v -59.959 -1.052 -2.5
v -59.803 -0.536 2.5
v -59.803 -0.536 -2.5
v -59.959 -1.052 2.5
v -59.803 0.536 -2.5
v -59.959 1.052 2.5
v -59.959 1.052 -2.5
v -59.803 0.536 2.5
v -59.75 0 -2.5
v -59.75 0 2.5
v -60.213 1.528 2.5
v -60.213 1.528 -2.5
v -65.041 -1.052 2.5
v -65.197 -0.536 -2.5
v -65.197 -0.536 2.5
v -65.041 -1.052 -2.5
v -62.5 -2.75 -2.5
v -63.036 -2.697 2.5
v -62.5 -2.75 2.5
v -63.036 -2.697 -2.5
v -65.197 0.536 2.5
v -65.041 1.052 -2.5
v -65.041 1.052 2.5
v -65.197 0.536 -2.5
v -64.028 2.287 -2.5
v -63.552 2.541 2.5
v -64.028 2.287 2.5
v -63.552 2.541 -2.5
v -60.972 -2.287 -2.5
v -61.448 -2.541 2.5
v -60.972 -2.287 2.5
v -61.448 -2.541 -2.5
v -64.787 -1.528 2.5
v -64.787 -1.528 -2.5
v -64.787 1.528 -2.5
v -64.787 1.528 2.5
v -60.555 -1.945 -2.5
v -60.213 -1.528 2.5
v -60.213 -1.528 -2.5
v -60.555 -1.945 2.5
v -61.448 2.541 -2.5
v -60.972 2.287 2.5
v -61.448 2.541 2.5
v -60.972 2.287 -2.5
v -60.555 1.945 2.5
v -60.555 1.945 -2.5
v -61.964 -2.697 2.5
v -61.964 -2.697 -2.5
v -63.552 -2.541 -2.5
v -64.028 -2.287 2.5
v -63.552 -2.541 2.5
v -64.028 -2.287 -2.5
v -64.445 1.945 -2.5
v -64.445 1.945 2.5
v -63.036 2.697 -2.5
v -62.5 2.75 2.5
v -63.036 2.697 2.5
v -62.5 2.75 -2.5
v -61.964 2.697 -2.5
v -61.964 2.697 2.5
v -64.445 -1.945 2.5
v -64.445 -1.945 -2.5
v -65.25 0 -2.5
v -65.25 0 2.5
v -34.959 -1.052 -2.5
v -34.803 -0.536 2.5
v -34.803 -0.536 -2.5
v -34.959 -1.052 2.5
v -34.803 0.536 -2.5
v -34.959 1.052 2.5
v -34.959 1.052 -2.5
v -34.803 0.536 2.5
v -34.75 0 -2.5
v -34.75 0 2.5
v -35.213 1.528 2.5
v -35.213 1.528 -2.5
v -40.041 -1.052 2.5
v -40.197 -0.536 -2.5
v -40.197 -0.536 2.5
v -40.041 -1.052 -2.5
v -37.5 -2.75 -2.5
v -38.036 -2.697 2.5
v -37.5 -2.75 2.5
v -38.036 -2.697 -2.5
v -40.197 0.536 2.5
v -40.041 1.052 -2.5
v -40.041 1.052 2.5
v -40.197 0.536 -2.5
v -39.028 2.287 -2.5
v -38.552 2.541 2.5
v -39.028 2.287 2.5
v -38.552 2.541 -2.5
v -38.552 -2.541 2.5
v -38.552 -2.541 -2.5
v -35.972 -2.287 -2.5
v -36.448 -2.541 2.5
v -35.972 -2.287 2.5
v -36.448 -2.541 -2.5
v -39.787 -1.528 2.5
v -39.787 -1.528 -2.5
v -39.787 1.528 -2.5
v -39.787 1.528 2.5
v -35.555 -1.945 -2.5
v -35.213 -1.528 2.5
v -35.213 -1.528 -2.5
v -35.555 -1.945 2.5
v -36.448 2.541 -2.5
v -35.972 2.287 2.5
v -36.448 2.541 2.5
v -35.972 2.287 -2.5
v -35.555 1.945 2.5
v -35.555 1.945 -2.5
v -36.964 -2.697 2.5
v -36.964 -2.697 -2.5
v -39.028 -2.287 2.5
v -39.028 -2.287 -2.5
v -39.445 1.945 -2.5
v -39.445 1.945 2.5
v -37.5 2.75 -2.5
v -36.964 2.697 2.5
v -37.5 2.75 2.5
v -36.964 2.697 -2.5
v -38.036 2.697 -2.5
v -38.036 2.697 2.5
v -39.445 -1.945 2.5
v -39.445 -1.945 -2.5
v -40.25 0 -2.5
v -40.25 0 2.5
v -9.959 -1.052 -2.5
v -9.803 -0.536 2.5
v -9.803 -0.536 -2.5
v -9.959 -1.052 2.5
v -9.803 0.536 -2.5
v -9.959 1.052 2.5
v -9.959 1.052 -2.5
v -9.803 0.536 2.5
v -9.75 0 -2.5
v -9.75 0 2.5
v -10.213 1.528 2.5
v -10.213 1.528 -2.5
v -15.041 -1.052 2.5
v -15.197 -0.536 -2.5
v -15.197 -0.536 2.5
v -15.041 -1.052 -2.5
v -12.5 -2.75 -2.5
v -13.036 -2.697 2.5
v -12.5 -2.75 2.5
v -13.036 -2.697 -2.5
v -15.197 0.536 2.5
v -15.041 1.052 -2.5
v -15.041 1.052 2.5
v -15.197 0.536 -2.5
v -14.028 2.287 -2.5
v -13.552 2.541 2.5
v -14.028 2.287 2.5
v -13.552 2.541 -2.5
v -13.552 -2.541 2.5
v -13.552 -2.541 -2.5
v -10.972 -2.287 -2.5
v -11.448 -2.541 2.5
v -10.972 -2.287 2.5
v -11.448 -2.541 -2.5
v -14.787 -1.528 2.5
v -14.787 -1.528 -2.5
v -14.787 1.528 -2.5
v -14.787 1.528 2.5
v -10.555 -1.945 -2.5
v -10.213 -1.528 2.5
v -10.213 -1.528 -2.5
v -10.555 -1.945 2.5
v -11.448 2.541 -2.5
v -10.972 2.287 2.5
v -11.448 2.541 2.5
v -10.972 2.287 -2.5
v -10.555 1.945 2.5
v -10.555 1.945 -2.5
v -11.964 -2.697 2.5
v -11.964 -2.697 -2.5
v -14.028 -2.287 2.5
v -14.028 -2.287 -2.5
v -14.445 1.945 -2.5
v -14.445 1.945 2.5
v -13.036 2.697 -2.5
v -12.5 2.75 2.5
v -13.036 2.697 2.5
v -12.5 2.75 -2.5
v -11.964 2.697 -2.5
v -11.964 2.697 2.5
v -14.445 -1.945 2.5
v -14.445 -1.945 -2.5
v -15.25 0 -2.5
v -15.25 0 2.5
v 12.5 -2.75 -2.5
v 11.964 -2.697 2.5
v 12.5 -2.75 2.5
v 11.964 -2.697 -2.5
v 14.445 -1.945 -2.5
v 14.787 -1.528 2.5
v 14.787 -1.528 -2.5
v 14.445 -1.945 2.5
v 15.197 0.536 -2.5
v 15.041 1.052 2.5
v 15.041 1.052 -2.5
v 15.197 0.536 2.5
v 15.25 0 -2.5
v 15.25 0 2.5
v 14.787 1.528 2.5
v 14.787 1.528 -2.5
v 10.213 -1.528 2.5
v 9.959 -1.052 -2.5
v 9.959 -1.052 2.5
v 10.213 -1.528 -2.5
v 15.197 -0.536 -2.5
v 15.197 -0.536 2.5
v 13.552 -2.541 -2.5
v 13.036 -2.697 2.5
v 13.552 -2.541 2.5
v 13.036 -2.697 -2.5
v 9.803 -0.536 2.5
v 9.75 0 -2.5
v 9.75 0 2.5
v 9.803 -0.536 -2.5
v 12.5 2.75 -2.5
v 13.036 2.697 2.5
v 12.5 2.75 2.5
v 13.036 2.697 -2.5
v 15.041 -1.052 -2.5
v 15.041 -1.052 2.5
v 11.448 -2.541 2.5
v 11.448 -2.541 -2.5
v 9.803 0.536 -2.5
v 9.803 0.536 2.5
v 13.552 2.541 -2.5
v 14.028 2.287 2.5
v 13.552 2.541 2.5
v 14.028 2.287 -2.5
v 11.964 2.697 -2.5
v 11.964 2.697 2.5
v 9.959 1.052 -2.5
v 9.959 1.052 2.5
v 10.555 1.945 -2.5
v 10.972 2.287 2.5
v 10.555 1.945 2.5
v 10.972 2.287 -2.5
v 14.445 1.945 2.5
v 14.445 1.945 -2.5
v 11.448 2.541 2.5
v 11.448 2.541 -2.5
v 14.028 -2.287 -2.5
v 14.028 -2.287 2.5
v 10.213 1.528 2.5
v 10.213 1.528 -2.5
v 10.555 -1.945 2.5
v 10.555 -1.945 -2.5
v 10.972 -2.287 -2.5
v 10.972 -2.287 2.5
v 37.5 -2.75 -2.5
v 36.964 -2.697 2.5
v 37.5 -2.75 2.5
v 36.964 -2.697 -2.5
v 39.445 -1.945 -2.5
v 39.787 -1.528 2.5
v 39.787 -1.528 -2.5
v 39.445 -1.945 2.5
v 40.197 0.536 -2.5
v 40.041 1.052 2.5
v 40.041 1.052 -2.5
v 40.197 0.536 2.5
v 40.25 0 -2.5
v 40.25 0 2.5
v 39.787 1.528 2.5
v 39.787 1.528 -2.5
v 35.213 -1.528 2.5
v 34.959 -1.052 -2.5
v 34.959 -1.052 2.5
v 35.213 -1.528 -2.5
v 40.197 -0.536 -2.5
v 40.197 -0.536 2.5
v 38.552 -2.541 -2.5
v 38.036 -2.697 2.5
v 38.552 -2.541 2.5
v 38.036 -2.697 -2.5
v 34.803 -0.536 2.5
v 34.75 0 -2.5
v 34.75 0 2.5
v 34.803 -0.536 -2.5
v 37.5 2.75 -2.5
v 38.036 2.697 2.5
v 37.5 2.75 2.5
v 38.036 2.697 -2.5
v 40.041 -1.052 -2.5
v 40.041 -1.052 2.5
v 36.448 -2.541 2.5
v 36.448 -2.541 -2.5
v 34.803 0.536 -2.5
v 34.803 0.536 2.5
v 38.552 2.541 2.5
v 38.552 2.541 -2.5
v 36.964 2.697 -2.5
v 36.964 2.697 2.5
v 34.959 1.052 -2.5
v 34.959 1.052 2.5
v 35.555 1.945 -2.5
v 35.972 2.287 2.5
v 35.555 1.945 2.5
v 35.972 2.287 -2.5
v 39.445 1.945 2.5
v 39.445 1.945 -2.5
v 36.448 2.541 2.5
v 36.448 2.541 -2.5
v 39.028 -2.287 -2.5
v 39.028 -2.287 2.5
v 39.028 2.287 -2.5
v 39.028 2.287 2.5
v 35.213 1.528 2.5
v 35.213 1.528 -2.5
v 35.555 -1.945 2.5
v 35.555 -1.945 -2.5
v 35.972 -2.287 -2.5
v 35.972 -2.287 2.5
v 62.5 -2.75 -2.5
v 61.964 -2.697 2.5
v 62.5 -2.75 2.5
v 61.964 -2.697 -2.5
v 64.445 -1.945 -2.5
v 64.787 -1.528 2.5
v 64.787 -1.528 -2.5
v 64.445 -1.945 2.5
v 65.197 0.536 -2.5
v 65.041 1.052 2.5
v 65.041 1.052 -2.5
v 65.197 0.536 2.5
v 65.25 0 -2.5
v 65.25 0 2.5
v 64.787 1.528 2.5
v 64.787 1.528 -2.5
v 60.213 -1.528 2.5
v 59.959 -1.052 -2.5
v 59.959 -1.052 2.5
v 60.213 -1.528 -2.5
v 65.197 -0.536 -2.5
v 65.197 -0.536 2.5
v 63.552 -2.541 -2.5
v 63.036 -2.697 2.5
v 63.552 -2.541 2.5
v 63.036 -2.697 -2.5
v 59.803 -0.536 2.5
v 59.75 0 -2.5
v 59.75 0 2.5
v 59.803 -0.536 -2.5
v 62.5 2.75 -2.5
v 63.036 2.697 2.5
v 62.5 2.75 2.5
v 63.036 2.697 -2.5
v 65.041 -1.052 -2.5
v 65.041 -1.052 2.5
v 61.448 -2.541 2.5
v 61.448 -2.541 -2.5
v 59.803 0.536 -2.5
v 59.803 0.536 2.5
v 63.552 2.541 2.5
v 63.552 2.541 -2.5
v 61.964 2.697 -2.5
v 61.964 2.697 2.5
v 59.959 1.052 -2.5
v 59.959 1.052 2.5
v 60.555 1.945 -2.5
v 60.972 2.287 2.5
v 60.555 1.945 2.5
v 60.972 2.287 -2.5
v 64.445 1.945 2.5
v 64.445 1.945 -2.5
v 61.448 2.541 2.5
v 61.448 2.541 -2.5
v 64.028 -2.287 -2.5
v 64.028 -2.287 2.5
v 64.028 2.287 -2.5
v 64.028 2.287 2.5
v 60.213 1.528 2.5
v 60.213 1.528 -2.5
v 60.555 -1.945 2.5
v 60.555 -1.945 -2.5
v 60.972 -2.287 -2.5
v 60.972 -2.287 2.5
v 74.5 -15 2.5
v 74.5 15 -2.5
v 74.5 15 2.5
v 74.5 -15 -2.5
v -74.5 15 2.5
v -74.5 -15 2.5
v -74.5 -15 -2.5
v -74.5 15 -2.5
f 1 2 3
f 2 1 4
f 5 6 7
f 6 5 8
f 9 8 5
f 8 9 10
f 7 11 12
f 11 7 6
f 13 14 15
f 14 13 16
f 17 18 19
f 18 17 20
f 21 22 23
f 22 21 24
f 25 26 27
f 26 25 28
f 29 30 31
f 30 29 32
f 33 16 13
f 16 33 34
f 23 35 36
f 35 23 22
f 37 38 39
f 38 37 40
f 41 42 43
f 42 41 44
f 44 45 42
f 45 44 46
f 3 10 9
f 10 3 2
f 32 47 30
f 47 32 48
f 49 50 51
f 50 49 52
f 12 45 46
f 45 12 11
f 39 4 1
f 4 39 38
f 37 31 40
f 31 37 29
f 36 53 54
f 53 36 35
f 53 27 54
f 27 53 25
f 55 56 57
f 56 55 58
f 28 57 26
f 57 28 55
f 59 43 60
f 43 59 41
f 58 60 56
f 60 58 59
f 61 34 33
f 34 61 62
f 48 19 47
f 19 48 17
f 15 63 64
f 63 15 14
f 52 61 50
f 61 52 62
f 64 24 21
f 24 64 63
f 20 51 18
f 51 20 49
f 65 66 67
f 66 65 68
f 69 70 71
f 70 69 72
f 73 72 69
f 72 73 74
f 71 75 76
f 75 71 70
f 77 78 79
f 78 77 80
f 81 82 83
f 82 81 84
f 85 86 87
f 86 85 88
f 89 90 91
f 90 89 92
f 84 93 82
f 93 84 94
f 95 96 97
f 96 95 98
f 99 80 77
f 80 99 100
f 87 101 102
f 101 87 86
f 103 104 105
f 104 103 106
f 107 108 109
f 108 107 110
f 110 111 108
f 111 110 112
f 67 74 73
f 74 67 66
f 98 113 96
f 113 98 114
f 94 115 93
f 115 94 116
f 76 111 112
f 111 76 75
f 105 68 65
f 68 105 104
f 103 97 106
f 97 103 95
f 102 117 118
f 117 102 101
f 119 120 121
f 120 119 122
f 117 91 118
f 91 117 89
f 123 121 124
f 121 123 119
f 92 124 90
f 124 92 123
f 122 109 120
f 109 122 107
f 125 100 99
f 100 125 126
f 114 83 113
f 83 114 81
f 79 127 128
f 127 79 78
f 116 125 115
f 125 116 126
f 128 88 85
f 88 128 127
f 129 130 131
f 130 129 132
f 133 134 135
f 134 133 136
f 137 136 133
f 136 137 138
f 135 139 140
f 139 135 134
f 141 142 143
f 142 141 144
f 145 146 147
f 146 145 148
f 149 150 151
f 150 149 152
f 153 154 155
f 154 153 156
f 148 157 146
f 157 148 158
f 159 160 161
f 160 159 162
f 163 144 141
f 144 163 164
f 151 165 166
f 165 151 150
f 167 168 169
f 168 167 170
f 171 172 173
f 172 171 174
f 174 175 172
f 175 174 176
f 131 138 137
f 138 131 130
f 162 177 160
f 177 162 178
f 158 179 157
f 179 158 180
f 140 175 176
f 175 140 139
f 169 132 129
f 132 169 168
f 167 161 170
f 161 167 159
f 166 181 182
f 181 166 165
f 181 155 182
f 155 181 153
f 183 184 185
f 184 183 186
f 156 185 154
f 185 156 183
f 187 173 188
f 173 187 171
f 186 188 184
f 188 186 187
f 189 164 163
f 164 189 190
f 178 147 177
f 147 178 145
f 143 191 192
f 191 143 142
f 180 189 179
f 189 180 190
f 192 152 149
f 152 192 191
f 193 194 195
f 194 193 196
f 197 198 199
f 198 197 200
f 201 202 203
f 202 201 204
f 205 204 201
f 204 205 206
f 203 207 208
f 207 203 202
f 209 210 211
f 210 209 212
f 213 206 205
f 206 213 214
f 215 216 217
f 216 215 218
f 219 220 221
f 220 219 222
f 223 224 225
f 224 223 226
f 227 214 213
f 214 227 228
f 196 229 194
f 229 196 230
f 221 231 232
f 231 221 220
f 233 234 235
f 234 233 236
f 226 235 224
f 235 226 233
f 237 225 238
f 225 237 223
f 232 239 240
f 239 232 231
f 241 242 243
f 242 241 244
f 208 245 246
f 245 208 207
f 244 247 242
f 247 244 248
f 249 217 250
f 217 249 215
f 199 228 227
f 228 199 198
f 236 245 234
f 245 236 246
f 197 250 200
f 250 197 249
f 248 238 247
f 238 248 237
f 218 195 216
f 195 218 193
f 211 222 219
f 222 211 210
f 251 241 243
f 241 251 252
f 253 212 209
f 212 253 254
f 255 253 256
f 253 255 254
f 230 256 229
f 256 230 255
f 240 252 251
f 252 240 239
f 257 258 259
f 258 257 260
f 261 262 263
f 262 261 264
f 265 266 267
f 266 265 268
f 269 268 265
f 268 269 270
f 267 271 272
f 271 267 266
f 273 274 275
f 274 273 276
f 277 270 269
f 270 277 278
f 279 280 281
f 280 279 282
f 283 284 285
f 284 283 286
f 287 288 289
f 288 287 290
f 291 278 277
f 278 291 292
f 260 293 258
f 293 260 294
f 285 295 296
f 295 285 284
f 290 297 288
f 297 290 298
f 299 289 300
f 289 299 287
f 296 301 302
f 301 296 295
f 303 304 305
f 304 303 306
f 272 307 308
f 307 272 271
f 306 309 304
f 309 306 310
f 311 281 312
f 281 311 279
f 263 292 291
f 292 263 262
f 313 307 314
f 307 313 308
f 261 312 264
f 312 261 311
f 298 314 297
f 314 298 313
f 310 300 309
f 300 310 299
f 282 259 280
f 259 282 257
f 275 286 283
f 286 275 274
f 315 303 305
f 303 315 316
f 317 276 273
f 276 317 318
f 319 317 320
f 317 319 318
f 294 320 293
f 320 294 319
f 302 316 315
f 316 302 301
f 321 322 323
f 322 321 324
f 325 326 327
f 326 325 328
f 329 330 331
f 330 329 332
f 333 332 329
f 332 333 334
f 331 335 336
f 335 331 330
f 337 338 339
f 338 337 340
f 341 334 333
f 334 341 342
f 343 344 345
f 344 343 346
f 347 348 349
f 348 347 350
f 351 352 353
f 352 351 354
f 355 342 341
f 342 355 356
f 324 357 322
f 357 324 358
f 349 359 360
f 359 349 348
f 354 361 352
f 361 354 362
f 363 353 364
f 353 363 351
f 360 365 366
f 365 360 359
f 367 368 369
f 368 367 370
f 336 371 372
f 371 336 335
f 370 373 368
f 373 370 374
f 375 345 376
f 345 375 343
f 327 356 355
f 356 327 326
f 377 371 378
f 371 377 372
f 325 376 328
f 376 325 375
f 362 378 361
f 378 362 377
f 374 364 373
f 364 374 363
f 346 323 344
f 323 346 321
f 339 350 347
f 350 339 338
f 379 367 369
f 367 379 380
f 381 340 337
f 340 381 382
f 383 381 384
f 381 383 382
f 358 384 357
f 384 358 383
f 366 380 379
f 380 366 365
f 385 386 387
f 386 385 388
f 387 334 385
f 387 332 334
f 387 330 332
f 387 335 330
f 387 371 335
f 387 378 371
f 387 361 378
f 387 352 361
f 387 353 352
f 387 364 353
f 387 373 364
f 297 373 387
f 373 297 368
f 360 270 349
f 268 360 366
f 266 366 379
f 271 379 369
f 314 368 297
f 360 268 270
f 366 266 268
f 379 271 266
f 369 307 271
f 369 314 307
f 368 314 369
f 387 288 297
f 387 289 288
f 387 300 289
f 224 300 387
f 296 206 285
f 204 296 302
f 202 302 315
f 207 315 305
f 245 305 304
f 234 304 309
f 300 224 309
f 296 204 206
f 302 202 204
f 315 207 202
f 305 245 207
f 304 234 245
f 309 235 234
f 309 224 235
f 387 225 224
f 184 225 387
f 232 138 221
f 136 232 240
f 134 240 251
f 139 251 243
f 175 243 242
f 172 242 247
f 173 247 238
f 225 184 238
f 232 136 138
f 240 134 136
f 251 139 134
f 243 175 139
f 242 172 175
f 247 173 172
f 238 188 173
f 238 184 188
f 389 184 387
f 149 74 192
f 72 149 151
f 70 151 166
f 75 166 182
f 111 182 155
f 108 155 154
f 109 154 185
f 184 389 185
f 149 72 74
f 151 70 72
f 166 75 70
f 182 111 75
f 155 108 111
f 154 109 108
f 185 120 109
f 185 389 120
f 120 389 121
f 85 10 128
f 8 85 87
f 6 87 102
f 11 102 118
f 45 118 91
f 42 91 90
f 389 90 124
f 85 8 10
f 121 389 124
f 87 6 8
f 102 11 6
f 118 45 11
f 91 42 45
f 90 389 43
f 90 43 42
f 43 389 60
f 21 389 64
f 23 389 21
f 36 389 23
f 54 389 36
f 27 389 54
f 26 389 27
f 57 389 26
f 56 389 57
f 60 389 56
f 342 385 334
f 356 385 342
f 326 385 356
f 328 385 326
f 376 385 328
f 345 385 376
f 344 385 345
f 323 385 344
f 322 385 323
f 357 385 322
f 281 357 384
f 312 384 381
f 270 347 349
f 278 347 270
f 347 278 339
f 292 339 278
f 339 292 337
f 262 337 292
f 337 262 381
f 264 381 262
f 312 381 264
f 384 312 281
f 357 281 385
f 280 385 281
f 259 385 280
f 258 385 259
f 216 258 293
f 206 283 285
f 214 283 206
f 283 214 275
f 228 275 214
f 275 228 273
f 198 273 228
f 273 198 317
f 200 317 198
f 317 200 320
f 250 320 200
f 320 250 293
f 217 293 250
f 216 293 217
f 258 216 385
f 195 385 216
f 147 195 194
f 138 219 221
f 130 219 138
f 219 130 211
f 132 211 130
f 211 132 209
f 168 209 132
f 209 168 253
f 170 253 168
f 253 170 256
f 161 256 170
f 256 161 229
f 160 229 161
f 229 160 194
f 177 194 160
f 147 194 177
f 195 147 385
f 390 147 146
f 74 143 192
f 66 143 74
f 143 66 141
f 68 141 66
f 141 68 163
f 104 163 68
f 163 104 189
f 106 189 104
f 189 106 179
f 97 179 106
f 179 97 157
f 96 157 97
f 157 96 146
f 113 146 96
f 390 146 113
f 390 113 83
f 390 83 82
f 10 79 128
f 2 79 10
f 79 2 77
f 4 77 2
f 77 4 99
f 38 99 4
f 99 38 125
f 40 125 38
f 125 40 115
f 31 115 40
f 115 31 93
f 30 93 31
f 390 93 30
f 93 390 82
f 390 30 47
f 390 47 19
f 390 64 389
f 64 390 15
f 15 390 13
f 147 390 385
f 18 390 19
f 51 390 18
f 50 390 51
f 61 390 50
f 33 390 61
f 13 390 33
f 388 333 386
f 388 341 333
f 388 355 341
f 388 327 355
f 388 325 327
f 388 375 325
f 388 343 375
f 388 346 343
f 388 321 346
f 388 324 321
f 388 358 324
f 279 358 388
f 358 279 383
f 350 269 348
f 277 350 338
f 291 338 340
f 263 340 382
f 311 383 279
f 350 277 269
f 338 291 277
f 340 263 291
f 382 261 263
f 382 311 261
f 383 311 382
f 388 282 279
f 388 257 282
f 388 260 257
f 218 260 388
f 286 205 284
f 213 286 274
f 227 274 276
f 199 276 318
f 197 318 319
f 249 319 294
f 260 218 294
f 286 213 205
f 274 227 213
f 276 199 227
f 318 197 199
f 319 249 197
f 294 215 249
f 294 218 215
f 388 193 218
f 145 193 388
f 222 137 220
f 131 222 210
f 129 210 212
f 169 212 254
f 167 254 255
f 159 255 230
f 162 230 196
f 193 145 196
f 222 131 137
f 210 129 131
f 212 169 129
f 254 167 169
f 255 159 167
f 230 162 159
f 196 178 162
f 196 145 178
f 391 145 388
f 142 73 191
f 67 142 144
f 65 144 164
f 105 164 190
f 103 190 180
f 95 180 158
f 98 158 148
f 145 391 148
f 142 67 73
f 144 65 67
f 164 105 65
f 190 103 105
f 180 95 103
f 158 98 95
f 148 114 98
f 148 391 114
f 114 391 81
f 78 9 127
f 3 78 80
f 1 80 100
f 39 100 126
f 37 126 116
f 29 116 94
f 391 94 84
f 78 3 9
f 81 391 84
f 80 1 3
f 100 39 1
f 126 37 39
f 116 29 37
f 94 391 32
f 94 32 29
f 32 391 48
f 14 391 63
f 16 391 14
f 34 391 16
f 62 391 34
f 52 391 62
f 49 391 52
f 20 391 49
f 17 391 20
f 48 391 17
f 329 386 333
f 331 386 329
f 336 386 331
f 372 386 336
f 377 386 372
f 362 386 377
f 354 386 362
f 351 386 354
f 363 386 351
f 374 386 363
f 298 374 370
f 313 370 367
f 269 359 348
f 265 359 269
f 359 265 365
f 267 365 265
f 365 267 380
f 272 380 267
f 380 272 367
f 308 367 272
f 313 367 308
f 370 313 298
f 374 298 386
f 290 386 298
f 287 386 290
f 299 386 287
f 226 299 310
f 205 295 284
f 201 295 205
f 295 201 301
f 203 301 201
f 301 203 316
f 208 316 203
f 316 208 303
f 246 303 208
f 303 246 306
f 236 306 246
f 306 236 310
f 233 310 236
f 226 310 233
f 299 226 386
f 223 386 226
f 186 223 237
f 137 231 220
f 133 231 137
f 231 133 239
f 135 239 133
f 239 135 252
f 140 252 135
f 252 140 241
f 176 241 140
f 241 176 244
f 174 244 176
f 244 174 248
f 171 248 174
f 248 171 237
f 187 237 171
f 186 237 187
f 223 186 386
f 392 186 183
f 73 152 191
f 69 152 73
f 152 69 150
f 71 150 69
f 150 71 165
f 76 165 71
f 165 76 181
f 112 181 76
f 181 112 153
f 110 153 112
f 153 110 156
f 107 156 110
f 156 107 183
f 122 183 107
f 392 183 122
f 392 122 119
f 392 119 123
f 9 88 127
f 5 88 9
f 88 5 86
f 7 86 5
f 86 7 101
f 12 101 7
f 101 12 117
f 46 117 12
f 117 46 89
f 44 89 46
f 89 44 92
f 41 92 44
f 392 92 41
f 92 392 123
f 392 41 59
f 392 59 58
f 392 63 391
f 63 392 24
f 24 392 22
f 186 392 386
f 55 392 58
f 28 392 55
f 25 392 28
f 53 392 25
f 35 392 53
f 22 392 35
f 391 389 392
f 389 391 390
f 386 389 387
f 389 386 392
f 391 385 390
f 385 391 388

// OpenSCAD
$fn = 32;

// ----------------------------------------------------------------------
// Hole bar, 6 x Ø5.5
// row layout, 12 mm edge offset
// ----------------------------------------------------------------------

// --- parameters (mm) ---
bar_w = 30;    // bar width (Y)
bar_t = 5;     // bar thickness (Z)
holes = 6;     // holes per row
hole_d = 5.5;  // hole diameter
edge = 12;     // offset from the bar end to the first hole
pitch = 25;    // pitch between neighbouring holes

// --- derived feature positions (mm) ---
span = (holes - 1) * pitch;   // = 125   distance between the end holes
bar_l = span + 2 * edge;      // = 149   overall bar length
start_x = -bar_l / 2 + edge;  // = -62.5   X of the first hole
feature_centers = [
  [start_x + 0 * pitch, 0],
  [start_x + 1 * pitch, 0],
  [start_x + 2 * pitch, 0],
  [start_x + 3 * pitch, 0],
  [start_x + 4 * pitch, 0],
  [start_x + 5 * pitch, 0]
];   // hole centres of the first row

// bar with one row of holes, drilled from feature_centers
difference() {
  translate([-bar_l / 2, -bar_w / 2, -bar_t / 2]) cube([bar_l, bar_w, bar_t]);
  for (centre = feature_centers)
    translate([centre[0], centre[1], 0])
      cylinder(d = hole_d, h = bar_t + 2, center = true);
}
